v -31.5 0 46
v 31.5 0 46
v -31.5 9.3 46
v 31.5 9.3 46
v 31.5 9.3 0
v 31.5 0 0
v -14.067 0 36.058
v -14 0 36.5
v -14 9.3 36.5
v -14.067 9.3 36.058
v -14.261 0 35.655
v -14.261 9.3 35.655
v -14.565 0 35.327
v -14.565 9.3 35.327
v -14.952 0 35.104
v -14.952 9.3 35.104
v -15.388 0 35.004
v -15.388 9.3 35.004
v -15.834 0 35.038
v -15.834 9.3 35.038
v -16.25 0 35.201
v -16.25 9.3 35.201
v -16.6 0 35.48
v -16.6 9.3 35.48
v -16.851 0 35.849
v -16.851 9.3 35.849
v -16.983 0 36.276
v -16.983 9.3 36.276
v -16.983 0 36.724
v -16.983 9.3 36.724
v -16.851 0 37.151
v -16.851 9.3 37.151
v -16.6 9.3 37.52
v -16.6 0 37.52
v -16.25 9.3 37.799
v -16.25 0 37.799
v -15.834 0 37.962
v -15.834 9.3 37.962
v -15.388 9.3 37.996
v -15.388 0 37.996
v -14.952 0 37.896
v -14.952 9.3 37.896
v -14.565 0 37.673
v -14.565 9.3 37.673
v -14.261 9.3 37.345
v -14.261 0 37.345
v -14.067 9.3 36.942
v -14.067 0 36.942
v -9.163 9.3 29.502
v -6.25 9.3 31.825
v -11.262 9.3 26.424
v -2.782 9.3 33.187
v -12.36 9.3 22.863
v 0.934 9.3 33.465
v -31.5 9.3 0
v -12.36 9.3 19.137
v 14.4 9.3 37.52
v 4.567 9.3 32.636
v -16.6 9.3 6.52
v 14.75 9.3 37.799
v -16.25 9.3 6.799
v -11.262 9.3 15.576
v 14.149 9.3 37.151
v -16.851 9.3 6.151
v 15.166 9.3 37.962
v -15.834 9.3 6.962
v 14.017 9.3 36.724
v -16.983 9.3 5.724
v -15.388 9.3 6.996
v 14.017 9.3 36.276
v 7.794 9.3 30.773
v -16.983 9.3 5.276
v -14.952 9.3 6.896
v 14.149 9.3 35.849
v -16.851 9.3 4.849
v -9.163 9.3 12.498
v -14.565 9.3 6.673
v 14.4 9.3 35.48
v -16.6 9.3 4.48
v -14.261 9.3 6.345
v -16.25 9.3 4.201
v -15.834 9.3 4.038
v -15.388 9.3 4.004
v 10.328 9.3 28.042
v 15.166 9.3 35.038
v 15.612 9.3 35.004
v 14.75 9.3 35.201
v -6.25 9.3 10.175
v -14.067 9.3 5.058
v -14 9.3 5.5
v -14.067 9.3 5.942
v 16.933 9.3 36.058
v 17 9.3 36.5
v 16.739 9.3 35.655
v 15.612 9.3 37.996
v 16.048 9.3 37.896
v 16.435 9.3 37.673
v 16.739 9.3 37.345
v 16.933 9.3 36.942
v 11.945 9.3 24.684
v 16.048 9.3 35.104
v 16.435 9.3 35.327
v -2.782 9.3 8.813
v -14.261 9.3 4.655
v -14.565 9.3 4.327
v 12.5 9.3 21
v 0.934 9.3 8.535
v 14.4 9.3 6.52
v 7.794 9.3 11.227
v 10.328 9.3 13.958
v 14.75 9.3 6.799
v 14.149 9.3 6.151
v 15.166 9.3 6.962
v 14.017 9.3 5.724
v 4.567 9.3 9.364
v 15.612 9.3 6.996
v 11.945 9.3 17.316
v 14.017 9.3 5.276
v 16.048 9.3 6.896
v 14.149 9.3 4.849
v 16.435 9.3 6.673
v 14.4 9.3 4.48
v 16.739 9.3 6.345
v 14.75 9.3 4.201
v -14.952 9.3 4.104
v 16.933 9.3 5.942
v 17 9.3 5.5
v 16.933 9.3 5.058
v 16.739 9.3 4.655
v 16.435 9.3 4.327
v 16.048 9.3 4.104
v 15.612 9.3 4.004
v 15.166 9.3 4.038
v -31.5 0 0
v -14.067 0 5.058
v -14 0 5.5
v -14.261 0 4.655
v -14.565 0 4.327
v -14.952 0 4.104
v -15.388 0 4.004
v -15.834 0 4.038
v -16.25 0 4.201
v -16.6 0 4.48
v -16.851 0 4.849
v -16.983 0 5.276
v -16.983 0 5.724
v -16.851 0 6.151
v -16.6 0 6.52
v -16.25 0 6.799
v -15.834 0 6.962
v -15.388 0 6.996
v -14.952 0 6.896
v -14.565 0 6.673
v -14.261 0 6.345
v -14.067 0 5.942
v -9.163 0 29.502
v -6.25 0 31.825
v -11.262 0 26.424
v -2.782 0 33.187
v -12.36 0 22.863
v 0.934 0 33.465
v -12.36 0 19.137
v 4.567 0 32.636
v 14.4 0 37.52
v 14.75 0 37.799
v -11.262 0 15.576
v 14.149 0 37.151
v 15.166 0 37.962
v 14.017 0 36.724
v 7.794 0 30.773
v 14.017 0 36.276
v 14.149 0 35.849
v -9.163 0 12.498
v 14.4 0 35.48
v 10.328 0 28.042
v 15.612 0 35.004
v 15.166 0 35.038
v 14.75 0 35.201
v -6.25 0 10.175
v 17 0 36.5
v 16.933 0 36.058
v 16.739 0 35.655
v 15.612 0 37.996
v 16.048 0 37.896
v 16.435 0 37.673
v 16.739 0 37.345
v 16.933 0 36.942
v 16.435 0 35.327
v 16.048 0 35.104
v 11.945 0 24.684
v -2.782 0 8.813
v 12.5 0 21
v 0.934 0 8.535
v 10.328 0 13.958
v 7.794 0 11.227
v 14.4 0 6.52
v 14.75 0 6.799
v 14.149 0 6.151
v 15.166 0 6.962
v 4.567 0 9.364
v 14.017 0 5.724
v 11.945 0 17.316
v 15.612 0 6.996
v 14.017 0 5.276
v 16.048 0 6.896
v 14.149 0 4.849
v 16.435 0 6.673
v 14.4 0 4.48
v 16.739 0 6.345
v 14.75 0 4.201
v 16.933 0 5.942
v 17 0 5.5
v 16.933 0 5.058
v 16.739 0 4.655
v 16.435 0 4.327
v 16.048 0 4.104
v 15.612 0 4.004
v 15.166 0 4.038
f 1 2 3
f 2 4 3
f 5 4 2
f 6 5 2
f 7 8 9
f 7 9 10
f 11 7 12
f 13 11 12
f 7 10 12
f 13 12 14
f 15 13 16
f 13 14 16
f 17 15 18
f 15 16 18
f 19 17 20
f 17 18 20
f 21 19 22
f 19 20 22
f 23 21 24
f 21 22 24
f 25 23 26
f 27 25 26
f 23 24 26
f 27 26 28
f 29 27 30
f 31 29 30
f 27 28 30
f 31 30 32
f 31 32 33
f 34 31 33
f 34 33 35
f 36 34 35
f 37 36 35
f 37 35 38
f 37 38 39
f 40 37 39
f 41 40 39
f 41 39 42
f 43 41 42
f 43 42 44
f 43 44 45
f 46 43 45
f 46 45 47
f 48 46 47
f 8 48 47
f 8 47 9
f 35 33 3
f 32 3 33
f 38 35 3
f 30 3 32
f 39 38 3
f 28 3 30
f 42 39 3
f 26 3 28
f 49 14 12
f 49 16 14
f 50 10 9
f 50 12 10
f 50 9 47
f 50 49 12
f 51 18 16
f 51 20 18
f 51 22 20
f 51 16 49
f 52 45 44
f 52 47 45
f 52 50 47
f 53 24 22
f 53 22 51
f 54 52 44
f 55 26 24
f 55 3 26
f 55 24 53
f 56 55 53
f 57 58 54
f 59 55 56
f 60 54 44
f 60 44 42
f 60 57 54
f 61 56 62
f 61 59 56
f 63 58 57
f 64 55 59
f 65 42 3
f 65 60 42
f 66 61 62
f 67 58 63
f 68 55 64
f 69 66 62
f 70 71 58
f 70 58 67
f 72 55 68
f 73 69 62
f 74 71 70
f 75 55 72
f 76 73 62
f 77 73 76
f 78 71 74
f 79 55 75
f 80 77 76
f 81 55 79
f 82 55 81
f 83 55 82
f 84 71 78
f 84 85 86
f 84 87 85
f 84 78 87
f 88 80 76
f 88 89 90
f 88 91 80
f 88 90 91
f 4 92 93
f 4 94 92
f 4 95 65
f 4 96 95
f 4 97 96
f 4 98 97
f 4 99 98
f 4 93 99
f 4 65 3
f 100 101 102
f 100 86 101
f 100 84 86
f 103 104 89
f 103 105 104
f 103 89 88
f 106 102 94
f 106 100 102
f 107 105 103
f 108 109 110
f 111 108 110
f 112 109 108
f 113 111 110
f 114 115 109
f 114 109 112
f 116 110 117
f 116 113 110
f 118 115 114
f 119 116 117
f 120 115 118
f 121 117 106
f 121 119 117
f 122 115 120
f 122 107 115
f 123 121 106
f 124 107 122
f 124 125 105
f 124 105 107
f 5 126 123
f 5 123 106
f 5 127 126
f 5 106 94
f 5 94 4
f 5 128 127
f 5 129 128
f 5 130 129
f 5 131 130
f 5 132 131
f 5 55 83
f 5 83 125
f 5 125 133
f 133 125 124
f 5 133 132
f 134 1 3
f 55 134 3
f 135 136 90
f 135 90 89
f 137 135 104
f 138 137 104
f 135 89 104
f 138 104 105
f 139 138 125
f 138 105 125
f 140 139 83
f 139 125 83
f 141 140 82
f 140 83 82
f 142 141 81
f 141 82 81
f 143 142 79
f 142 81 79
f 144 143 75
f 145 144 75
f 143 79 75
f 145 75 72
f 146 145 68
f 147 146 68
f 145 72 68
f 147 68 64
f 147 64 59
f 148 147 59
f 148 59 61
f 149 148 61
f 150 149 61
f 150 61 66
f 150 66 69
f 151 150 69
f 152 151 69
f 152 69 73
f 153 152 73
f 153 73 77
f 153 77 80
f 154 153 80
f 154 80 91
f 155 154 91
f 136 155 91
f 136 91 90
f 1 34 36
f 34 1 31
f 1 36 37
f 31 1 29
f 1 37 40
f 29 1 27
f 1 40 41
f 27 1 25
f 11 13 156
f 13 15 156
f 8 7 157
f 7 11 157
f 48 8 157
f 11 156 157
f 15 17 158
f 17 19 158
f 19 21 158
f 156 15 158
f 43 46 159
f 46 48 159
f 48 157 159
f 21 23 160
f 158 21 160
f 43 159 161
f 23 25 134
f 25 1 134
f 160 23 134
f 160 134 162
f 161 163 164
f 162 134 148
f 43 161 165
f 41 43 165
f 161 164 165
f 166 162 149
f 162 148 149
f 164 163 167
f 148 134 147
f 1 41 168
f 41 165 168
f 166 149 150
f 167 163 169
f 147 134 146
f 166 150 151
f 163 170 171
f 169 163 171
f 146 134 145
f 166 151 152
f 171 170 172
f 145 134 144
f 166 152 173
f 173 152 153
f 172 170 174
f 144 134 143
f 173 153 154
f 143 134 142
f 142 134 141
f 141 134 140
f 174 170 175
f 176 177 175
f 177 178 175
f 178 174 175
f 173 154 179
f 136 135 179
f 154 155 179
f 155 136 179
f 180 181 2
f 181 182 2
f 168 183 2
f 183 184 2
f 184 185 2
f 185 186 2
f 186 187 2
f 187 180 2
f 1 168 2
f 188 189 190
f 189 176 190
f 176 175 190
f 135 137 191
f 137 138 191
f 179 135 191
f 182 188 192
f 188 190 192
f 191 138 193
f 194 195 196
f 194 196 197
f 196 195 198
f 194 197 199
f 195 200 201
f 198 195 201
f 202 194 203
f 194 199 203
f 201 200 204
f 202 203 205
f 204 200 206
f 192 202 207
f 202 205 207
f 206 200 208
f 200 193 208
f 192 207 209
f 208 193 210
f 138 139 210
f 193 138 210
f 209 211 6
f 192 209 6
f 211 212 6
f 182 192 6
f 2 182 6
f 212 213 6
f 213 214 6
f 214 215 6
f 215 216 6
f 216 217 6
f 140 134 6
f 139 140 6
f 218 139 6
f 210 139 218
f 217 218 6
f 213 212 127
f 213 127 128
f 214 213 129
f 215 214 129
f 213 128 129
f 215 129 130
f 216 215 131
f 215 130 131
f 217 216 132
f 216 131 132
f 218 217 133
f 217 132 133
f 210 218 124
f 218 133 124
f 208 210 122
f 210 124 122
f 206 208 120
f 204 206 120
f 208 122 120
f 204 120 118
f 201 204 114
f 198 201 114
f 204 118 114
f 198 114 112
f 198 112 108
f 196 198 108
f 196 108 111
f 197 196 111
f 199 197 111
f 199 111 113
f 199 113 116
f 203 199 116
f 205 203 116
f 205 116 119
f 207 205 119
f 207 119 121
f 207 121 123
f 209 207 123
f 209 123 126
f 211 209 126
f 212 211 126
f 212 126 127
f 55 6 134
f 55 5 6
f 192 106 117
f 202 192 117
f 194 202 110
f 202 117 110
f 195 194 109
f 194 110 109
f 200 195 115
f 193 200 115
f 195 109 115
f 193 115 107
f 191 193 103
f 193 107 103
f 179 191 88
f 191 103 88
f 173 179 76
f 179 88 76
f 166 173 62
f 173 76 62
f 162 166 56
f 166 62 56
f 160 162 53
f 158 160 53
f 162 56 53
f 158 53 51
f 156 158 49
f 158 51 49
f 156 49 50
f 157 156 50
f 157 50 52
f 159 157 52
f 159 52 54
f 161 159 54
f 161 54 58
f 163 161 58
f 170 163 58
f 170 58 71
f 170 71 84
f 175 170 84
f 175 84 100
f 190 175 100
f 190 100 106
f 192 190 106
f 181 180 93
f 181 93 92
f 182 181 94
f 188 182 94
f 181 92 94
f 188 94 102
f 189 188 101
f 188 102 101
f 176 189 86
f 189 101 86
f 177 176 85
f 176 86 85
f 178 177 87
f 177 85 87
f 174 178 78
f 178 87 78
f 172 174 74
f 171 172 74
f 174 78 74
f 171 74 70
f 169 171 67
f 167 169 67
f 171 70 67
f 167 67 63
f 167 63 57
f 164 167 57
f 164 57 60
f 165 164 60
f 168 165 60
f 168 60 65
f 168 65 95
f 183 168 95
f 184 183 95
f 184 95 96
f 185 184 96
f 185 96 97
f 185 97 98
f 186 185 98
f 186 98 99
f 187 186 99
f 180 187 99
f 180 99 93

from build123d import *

# Parameters (mm, degrees)
BOSS_EXTRUDE1_DEPTH = 46
CUT_EXTRUDE1_REACH  = 11.3
SKETCH2_R           = 12.5
SKETCH2_R_2         = 1.5


with BuildPart() as part:
    # Sketch1 → Boss-Extrude1 (new body)
    with BuildSketch(Plane.XY):
        Polygon((0, 0), (-31.5, 0), (-31.5, 9.3), (31.5, 9.3), (31.5, 0), align=None)
    extrude(amount=BOSS_EXTRUDE1_DEPTH)

    # Sketch2 → Cut-Extrude1 (cut, up to next)
    with BuildSketch(Plane(origin=(0, 9.3, 0), x_dir=(1, 0, 0), z_dir=(0, 1, 0)), mode=Mode.PRIVATE) as cut_extrude1_sk1:
        with Locations((0, -21)):
            Circle(SKETCH2_R)
    cut_extrude1_tool1 = extrude(cut_extrude1_sk1.sketch, amount=-CUT_EXTRUDE1_REACH, mode=Mode.PRIVATE) & part.part
    add(cut_extrude1_tool1.solids().sort_by_distance((0, 9.3, 21))[0], mode=Mode.SUBTRACT)
    # Sketch2 → Cut-Extrude1 (cut, up to next)
    with BuildSketch(Plane(origin=(0, 9.3, 0), x_dir=(1, 0, 0), z_dir=(0, 1, 0)), mode=Mode.PRIVATE) as cut_extrude1_sk2:
        with Locations((-15.5, -5.5)):
            Circle(SKETCH2_R_2)
    cut_extrude1_tool2 = extrude(cut_extrude1_sk2.sketch, amount=-CUT_EXTRUDE1_REACH, mode=Mode.PRIVATE) & part.part
    add(cut_extrude1_tool2.solids().sort_by_distance((-15.5, 9.3, 5.5))[0], mode=Mode.SUBTRACT)
    # Sketch2 → Cut-Extrude1 (cut, up to next)
    with BuildSketch(Plane(origin=(0, 9.3, 0), x_dir=(1, 0, 0), z_dir=(0, 1, 0)), mode=Mode.PRIVATE) as cut_extrude1_sk3:
        with Locations((-15.5, -36.5)):
            Circle(SKETCH2_R_2)
    cut_extrude1_tool3 = extrude(cut_extrude1_sk3.sketch, amount=-CUT_EXTRUDE1_REACH, mode=Mode.PRIVATE) & part.part
    add(cut_extrude1_tool3.solids().sort_by_distance((-15.5, 9.3, 36.5))[0], mode=Mode.SUBTRACT)
    # Sketch2 → Cut-Extrude1 (cut, up to next)
    with BuildSketch(Plane(origin=(0, 9.3, 0), x_dir=(1, 0, 0), z_dir=(0, 1, 0)), mode=Mode.PRIVATE) as cut_extrude1_sk4:
        with Locations((15.5, -5.5)):
            Circle(SKETCH2_R_2)
    cut_extrude1_tool4 = extrude(cut_extrude1_sk4.sketch, amount=-CUT_EXTRUDE1_REACH, mode=Mode.PRIVATE) & part.part
    add(cut_extrude1_tool4.solids().sort_by_distance((15.5, 9.3, 5.5))[0], mode=Mode.SUBTRACT)
    # Sketch2 → Cut-Extrude1 (cut, up to next)
    with BuildSketch(Plane(origin=(0, 9.3, 0), x_dir=(1, 0, 0), z_dir=(0, 1, 0)), mode=Mode.PRIVATE) as cut_extrude1_sk5:
        with Locations((15.5, -36.5)):
            Circle(SKETCH2_R_2)
    cut_extrude1_tool5 = extrude(cut_extrude1_sk5.sketch, amount=-CUT_EXTRUDE1_REACH, mode=Mode.PRIVATE) & part.part
    add(cut_extrude1_tool5.solids().sort_by_distance((15.5, 9.3, 36.5))[0], mode=Mode.SUBTRACT)


solid = part.part
